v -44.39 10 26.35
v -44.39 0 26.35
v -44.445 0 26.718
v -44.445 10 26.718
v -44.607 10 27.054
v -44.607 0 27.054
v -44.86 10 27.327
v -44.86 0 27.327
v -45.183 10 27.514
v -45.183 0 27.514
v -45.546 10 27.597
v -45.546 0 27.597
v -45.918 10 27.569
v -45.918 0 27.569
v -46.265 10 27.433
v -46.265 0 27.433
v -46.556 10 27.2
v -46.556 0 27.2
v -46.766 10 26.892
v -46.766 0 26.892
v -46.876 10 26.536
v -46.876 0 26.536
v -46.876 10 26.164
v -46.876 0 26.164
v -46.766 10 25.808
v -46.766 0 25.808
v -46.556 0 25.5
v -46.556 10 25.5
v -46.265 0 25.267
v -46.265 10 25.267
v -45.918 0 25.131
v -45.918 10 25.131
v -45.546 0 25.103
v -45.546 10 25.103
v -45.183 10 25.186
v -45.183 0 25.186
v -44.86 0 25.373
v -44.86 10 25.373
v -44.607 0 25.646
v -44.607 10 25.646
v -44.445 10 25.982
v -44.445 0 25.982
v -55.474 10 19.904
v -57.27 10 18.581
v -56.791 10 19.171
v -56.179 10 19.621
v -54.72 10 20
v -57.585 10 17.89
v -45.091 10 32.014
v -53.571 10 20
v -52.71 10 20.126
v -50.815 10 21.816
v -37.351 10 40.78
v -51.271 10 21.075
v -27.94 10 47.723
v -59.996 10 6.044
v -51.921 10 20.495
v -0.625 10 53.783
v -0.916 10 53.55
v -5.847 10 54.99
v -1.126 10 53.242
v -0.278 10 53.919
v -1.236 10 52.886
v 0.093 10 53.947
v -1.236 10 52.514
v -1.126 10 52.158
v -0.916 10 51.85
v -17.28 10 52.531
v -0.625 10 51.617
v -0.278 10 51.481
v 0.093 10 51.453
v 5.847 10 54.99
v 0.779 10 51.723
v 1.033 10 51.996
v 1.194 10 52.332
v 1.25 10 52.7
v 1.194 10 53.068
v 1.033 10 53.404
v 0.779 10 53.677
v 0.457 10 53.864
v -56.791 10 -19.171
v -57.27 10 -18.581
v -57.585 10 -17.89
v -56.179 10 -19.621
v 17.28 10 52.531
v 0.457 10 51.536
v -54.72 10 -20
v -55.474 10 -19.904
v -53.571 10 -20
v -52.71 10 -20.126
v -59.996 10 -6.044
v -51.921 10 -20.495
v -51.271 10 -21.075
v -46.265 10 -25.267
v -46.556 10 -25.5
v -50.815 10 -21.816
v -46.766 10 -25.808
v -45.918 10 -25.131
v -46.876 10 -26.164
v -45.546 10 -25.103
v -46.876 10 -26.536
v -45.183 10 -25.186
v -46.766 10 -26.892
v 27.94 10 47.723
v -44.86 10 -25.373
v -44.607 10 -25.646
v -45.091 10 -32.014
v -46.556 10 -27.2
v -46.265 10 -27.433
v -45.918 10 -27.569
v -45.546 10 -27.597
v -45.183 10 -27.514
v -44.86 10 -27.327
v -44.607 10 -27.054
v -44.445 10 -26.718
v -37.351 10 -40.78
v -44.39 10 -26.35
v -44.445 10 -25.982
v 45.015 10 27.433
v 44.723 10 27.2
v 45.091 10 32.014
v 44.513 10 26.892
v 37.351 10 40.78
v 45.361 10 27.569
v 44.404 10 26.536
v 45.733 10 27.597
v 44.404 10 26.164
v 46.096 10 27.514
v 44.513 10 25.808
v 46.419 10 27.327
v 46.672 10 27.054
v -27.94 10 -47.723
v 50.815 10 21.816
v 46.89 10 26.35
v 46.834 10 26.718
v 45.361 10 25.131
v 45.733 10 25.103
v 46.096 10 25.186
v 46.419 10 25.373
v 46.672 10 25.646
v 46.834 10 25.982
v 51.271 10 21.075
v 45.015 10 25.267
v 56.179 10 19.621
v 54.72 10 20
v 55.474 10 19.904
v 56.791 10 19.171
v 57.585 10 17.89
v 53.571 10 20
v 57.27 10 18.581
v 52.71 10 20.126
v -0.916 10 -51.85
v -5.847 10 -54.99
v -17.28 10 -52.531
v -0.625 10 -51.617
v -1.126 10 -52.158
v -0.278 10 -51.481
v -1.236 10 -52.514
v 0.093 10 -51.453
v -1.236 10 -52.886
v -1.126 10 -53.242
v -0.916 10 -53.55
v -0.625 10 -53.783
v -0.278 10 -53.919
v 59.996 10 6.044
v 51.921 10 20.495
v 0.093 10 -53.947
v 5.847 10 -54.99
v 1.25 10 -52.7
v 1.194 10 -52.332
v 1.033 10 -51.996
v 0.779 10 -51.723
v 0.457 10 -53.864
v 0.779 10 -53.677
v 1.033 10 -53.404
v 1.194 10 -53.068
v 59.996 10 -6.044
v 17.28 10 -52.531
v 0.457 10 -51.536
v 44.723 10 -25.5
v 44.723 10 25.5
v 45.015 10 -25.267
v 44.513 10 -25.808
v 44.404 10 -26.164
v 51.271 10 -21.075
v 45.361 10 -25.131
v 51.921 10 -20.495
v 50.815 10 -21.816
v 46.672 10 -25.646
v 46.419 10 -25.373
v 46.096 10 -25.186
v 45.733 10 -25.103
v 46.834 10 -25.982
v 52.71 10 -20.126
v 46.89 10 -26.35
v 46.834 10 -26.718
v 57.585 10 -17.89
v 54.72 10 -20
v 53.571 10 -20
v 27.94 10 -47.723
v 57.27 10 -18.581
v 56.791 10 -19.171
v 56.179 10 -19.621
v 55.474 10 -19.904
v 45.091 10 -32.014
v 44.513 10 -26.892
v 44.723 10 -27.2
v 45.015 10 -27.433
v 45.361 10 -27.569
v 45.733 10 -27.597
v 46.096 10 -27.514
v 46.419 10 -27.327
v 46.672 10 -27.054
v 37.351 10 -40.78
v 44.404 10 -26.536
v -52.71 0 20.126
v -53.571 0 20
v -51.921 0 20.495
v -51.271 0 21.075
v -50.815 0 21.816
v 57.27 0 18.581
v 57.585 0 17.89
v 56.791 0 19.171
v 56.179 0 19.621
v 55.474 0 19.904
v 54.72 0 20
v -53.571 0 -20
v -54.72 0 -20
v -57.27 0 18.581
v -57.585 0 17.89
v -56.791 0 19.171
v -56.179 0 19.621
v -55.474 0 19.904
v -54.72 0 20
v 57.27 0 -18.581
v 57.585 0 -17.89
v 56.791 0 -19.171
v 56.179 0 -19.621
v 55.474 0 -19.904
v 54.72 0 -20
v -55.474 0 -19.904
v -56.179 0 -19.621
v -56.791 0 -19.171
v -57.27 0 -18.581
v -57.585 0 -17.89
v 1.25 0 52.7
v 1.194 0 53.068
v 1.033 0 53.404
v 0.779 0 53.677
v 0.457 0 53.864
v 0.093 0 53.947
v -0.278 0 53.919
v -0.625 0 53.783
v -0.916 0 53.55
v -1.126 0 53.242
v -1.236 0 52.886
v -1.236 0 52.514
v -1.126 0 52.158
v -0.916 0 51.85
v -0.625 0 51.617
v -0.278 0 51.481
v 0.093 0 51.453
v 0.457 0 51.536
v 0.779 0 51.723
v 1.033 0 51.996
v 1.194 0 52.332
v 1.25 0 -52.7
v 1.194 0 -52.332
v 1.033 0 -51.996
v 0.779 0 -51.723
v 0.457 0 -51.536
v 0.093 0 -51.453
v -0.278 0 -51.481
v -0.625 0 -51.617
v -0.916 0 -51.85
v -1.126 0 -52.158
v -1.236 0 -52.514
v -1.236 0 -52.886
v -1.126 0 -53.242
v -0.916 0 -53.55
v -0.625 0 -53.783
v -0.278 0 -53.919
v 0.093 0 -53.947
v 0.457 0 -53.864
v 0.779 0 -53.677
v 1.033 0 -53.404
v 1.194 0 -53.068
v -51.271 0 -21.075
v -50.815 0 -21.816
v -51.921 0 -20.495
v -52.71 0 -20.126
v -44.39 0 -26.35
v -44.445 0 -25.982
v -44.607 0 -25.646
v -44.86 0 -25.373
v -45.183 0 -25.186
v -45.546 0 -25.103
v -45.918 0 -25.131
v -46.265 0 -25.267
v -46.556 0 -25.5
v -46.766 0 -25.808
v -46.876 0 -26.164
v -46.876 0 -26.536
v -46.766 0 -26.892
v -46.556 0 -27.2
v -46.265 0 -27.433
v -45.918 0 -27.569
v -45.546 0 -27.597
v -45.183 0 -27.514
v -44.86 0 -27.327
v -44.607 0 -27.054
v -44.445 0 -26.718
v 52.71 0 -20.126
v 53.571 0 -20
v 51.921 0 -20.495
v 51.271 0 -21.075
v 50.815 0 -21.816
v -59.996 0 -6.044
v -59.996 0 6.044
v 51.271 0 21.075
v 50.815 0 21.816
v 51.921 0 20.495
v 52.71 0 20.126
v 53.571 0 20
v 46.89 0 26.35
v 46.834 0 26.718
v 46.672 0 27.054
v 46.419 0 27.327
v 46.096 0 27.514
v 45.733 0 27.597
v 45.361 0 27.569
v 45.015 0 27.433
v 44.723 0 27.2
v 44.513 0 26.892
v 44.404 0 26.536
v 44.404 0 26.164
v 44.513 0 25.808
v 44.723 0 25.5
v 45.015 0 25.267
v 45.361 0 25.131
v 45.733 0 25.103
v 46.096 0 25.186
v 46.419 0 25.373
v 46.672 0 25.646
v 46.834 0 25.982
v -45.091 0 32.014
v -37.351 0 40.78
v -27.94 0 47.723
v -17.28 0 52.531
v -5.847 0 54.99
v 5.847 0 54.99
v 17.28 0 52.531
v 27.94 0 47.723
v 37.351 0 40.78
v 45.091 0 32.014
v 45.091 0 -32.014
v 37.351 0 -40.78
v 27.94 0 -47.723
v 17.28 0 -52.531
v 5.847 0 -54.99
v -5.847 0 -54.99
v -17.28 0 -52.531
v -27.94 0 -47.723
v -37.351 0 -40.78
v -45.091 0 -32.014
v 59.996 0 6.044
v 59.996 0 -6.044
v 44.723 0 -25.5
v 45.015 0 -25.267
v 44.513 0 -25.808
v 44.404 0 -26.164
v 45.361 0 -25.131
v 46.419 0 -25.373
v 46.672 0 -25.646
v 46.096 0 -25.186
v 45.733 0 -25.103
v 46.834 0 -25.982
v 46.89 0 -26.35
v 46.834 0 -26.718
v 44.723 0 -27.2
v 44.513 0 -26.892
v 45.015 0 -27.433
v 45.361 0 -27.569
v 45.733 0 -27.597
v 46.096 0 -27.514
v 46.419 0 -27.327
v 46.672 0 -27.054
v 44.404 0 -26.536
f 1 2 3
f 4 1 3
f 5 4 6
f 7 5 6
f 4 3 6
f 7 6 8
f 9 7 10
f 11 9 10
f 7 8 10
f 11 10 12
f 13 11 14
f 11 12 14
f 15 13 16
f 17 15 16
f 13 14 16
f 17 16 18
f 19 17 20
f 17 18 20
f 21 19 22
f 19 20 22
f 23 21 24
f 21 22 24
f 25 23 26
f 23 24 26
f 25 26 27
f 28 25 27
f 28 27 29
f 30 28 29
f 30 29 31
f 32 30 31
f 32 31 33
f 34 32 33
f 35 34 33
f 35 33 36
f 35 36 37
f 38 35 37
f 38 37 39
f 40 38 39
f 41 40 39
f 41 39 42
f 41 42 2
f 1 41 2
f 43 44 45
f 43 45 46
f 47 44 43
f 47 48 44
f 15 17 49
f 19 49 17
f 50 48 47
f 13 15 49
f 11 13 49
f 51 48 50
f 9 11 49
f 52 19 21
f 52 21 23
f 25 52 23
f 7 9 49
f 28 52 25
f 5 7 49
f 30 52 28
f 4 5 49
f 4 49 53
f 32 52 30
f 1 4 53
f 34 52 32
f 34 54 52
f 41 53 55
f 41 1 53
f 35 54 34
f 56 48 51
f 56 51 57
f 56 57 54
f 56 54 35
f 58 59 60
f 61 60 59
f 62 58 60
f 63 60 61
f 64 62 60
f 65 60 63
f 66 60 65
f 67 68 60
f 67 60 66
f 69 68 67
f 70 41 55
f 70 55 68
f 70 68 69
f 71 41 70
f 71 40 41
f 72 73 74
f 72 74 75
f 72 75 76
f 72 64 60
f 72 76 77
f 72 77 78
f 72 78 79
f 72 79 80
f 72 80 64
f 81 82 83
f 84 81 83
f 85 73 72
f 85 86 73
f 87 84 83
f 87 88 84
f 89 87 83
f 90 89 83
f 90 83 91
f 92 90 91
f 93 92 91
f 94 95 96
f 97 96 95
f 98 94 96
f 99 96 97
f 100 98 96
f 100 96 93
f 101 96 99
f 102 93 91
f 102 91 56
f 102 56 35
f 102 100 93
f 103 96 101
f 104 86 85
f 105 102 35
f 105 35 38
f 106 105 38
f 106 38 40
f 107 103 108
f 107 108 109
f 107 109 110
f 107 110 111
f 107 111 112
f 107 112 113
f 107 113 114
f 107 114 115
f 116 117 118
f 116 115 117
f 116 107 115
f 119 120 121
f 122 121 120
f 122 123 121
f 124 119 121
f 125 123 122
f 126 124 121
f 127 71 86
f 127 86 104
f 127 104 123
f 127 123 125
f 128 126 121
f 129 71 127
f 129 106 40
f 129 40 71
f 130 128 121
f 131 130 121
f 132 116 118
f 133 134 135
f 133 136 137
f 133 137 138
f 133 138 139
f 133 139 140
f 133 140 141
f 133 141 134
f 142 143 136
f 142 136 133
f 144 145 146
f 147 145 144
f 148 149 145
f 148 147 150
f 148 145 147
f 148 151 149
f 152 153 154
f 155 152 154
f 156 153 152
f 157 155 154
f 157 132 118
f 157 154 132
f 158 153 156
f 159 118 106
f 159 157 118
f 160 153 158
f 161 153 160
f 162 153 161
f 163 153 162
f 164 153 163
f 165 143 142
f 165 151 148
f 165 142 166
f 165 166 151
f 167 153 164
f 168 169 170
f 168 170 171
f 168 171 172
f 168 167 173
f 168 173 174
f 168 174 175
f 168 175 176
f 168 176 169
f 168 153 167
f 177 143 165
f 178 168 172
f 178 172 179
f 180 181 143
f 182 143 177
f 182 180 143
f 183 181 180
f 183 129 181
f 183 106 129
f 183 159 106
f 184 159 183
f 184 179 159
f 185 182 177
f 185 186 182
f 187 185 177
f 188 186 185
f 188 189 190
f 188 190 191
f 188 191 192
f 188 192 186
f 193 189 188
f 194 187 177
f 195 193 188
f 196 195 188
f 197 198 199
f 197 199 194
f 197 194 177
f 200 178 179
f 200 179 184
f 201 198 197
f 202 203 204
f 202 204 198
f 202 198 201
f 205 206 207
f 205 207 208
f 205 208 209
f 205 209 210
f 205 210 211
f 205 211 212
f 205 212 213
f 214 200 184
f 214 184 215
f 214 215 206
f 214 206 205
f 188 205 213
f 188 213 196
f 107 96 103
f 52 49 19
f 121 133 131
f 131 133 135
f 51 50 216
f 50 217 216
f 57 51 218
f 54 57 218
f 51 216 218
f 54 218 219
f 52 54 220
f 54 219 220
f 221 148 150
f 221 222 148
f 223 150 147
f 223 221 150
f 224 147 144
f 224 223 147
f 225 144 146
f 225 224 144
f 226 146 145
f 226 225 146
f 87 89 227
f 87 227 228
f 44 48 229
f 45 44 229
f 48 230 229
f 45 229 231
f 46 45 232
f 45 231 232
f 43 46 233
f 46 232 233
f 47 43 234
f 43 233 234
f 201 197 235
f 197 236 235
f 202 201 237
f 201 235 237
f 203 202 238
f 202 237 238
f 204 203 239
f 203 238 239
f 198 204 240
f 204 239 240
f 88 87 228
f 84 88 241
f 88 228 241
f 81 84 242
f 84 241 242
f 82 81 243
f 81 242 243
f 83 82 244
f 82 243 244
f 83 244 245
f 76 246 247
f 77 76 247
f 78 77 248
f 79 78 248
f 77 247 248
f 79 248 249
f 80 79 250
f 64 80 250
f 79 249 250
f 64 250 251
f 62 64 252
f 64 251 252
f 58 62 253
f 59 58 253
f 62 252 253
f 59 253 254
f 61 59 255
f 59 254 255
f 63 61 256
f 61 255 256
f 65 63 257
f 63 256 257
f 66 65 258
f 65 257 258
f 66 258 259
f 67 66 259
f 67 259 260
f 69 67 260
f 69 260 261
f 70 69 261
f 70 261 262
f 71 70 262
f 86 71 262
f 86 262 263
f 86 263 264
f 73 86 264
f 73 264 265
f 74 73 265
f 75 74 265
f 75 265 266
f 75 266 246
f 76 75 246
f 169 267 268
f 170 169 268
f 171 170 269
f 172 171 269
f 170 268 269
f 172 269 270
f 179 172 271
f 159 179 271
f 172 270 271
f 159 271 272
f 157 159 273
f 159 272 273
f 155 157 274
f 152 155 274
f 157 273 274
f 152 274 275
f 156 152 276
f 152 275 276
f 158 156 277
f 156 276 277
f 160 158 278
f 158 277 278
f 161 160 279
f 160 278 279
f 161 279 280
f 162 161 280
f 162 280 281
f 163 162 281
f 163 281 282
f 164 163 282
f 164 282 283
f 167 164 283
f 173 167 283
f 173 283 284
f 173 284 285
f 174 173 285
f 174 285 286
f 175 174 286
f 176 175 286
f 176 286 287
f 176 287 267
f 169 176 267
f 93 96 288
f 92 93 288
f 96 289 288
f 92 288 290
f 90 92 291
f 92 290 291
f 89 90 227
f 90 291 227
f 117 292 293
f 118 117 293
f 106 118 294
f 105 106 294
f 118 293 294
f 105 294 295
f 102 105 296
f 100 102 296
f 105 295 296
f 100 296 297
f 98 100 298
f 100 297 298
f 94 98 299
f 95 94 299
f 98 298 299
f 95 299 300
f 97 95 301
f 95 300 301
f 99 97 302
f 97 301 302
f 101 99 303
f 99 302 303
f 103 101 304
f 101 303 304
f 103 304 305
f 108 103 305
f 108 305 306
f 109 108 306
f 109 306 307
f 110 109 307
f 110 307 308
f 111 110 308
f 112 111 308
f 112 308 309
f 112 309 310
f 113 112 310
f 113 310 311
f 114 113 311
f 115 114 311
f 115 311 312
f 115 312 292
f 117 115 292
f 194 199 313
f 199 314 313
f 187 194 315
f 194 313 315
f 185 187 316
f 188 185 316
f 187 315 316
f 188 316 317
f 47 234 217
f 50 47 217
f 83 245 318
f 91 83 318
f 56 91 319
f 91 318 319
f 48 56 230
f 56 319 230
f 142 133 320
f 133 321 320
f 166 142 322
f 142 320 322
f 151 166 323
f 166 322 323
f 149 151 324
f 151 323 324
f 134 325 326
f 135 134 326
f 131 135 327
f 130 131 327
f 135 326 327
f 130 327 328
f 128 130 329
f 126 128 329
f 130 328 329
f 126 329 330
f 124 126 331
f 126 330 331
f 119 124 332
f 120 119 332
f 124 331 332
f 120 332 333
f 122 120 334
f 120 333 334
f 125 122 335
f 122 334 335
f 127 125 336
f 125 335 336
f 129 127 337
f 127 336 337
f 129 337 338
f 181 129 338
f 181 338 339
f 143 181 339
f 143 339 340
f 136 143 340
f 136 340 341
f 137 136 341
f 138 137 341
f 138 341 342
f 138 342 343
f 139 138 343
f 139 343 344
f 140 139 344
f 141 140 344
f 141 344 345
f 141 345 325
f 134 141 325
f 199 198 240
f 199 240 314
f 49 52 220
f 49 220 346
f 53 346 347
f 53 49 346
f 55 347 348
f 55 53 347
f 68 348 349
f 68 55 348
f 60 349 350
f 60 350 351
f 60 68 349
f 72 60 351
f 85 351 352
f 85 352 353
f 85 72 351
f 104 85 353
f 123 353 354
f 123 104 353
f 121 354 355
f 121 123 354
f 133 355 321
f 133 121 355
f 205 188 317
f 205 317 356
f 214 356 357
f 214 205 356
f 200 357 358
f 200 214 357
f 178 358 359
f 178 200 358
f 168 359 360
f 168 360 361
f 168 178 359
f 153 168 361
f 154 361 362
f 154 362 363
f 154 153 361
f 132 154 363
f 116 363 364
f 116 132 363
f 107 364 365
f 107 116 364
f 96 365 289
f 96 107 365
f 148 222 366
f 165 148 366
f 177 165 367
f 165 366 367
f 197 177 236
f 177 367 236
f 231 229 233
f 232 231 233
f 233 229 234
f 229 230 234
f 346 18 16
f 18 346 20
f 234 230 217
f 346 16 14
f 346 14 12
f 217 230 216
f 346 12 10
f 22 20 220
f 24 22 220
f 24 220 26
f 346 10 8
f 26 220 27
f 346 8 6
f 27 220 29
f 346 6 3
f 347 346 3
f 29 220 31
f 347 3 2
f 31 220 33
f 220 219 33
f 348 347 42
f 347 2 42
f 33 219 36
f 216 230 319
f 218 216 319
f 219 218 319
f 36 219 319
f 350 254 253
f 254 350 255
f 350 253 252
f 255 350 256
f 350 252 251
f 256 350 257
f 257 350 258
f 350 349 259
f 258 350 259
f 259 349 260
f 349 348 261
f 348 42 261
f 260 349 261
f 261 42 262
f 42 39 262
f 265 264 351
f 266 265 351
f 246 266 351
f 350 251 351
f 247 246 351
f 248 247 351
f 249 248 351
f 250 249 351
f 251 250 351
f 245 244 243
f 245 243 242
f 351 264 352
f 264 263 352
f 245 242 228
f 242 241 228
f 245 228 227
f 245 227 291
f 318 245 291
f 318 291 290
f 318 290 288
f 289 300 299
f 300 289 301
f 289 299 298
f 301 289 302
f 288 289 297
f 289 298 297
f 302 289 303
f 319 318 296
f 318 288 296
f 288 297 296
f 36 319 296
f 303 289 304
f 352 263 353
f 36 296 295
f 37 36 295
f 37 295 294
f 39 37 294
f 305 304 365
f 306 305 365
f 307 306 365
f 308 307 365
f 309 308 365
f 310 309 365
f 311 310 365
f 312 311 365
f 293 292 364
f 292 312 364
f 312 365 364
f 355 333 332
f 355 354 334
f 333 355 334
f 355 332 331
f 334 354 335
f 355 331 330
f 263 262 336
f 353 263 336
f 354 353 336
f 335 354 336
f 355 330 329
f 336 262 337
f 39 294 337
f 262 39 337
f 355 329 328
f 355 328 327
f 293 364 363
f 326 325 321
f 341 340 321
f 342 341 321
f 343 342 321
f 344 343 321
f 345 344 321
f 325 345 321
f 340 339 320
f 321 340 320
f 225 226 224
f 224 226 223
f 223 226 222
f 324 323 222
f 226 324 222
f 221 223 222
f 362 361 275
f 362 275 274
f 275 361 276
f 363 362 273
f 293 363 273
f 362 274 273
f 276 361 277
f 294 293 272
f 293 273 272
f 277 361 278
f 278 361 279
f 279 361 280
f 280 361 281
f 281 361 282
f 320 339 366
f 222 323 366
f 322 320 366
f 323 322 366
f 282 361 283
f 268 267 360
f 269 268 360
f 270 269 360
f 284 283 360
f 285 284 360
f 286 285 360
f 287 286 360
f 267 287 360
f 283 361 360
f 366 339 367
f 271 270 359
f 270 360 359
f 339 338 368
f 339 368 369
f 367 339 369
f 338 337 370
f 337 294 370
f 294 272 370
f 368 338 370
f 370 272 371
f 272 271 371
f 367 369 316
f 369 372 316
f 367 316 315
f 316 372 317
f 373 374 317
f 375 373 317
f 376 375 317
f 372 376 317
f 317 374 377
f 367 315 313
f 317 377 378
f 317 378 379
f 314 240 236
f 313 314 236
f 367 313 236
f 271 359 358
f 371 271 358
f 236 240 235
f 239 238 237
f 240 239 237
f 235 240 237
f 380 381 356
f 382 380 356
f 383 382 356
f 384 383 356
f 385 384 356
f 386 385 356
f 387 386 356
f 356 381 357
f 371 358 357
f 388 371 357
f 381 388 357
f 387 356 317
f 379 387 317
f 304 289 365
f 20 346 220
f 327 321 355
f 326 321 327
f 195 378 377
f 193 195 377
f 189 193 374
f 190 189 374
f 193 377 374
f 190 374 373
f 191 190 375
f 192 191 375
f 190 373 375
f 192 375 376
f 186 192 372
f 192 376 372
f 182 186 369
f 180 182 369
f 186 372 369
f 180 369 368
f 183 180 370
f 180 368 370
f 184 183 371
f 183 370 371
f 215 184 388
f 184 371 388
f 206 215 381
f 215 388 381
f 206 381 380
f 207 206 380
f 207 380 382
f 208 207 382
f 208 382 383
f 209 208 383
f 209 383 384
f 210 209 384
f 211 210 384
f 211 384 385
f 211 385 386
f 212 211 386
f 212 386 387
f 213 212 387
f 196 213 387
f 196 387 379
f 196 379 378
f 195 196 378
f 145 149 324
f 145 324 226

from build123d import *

# Parameters (mm, degrees)
SKETCH_3_R          = 60.3
EXTRUDE_2_DEPTH     = 10
CUT_EXTRUDE_2_DEPTH = 11
FILLET_1_R          = 3
SKETCH_5_R          = 1.25
CUT_EXTRUDE_3_DEPTH = 11


with BuildPart() as part:
    # 草图3 → 凸台-拉伸2 (new body)
    with BuildSketch(Plane(origin=(0, 0, 0), x_dir=(1, 0, 0), z_dir=(0, 1, 0))):
        Circle(SKETCH_3_R)
    extrude(amount=EXTRUDE_2_DEPTH)

    # 草图4 → 切除-拉伸2 (cut, through all)
    with BuildSketch(Plane(origin=(0, 10, 0), x_dir=(1, 0, 0), z_dir=(0, 1, 0))):
        with BuildLine():
            Line((-51.556667852, 20), (-56.886641666, 20))
            ThreePointArc((-56.886641666, 20), (0, 60.3), (56.886641666, 20))
            Line((56.886641666, 20), (51.556667852, 20))
            ThreePointArc((51.556667852, 20), (0, 55.3), (-51.556667852, 20))
        make_face()
        with BuildLine():
            Line((-56.886641666, -20), (-51.556667852, -20))
            ThreePointArc((-51.556667852, -20), (0, -55.3), (51.556667852, -20))
            Line((51.556667852, -20), (56.886641666, -20))
            ThreePointArc((56.886641666, -20), (0, -60.3), (-56.886641666, -20))
        make_face()
    extrude(amount=-CUT_EXTRUDE_2_DEPTH, mode=Mode.SUBTRACT)

    # 圆角1
    fillet_1_edges = [part.edges().sort_by_distance(p)[0] for p in [
        (51.556667852, 5, -20),
        (-51.556667852, 5, -20),
        (-56.886641666, 5, -20),
        (56.886641666, 5, -20),
        (-51.556667852, 5, 20),
        (51.556667852, 5, 20),
        (56.886641666, 5, 20),
        (-56.886641666, 5, 20),
    ]]
    fillet(fillet_1_edges, radius=FILLET_1_R)

    # 草图5 → 切除-拉伸3 (cut, through all)
    with BuildSketch(Plane.XZ):
        with Locations((0, -52.7)):
            Circle(SKETCH_5_R)
        with Locations((-45.639538779, -26.35)):
            Circle(SKETCH_5_R)
        with Locations((-45.639538779, 26.35)):
            Circle(SKETCH_5_R)
        with Locations((0, 52.7)):
            Circle(SKETCH_5_R)
        with Locations((45.639538779, 26.35)):
            Circle(SKETCH_5_R)
        with Locations((45.639538779, -26.35)):
            Circle(SKETCH_5_R)
    extrude(amount=-CUT_EXTRUDE_3_DEPTH, mode=Mode.SUBTRACT)


solid = part.part
